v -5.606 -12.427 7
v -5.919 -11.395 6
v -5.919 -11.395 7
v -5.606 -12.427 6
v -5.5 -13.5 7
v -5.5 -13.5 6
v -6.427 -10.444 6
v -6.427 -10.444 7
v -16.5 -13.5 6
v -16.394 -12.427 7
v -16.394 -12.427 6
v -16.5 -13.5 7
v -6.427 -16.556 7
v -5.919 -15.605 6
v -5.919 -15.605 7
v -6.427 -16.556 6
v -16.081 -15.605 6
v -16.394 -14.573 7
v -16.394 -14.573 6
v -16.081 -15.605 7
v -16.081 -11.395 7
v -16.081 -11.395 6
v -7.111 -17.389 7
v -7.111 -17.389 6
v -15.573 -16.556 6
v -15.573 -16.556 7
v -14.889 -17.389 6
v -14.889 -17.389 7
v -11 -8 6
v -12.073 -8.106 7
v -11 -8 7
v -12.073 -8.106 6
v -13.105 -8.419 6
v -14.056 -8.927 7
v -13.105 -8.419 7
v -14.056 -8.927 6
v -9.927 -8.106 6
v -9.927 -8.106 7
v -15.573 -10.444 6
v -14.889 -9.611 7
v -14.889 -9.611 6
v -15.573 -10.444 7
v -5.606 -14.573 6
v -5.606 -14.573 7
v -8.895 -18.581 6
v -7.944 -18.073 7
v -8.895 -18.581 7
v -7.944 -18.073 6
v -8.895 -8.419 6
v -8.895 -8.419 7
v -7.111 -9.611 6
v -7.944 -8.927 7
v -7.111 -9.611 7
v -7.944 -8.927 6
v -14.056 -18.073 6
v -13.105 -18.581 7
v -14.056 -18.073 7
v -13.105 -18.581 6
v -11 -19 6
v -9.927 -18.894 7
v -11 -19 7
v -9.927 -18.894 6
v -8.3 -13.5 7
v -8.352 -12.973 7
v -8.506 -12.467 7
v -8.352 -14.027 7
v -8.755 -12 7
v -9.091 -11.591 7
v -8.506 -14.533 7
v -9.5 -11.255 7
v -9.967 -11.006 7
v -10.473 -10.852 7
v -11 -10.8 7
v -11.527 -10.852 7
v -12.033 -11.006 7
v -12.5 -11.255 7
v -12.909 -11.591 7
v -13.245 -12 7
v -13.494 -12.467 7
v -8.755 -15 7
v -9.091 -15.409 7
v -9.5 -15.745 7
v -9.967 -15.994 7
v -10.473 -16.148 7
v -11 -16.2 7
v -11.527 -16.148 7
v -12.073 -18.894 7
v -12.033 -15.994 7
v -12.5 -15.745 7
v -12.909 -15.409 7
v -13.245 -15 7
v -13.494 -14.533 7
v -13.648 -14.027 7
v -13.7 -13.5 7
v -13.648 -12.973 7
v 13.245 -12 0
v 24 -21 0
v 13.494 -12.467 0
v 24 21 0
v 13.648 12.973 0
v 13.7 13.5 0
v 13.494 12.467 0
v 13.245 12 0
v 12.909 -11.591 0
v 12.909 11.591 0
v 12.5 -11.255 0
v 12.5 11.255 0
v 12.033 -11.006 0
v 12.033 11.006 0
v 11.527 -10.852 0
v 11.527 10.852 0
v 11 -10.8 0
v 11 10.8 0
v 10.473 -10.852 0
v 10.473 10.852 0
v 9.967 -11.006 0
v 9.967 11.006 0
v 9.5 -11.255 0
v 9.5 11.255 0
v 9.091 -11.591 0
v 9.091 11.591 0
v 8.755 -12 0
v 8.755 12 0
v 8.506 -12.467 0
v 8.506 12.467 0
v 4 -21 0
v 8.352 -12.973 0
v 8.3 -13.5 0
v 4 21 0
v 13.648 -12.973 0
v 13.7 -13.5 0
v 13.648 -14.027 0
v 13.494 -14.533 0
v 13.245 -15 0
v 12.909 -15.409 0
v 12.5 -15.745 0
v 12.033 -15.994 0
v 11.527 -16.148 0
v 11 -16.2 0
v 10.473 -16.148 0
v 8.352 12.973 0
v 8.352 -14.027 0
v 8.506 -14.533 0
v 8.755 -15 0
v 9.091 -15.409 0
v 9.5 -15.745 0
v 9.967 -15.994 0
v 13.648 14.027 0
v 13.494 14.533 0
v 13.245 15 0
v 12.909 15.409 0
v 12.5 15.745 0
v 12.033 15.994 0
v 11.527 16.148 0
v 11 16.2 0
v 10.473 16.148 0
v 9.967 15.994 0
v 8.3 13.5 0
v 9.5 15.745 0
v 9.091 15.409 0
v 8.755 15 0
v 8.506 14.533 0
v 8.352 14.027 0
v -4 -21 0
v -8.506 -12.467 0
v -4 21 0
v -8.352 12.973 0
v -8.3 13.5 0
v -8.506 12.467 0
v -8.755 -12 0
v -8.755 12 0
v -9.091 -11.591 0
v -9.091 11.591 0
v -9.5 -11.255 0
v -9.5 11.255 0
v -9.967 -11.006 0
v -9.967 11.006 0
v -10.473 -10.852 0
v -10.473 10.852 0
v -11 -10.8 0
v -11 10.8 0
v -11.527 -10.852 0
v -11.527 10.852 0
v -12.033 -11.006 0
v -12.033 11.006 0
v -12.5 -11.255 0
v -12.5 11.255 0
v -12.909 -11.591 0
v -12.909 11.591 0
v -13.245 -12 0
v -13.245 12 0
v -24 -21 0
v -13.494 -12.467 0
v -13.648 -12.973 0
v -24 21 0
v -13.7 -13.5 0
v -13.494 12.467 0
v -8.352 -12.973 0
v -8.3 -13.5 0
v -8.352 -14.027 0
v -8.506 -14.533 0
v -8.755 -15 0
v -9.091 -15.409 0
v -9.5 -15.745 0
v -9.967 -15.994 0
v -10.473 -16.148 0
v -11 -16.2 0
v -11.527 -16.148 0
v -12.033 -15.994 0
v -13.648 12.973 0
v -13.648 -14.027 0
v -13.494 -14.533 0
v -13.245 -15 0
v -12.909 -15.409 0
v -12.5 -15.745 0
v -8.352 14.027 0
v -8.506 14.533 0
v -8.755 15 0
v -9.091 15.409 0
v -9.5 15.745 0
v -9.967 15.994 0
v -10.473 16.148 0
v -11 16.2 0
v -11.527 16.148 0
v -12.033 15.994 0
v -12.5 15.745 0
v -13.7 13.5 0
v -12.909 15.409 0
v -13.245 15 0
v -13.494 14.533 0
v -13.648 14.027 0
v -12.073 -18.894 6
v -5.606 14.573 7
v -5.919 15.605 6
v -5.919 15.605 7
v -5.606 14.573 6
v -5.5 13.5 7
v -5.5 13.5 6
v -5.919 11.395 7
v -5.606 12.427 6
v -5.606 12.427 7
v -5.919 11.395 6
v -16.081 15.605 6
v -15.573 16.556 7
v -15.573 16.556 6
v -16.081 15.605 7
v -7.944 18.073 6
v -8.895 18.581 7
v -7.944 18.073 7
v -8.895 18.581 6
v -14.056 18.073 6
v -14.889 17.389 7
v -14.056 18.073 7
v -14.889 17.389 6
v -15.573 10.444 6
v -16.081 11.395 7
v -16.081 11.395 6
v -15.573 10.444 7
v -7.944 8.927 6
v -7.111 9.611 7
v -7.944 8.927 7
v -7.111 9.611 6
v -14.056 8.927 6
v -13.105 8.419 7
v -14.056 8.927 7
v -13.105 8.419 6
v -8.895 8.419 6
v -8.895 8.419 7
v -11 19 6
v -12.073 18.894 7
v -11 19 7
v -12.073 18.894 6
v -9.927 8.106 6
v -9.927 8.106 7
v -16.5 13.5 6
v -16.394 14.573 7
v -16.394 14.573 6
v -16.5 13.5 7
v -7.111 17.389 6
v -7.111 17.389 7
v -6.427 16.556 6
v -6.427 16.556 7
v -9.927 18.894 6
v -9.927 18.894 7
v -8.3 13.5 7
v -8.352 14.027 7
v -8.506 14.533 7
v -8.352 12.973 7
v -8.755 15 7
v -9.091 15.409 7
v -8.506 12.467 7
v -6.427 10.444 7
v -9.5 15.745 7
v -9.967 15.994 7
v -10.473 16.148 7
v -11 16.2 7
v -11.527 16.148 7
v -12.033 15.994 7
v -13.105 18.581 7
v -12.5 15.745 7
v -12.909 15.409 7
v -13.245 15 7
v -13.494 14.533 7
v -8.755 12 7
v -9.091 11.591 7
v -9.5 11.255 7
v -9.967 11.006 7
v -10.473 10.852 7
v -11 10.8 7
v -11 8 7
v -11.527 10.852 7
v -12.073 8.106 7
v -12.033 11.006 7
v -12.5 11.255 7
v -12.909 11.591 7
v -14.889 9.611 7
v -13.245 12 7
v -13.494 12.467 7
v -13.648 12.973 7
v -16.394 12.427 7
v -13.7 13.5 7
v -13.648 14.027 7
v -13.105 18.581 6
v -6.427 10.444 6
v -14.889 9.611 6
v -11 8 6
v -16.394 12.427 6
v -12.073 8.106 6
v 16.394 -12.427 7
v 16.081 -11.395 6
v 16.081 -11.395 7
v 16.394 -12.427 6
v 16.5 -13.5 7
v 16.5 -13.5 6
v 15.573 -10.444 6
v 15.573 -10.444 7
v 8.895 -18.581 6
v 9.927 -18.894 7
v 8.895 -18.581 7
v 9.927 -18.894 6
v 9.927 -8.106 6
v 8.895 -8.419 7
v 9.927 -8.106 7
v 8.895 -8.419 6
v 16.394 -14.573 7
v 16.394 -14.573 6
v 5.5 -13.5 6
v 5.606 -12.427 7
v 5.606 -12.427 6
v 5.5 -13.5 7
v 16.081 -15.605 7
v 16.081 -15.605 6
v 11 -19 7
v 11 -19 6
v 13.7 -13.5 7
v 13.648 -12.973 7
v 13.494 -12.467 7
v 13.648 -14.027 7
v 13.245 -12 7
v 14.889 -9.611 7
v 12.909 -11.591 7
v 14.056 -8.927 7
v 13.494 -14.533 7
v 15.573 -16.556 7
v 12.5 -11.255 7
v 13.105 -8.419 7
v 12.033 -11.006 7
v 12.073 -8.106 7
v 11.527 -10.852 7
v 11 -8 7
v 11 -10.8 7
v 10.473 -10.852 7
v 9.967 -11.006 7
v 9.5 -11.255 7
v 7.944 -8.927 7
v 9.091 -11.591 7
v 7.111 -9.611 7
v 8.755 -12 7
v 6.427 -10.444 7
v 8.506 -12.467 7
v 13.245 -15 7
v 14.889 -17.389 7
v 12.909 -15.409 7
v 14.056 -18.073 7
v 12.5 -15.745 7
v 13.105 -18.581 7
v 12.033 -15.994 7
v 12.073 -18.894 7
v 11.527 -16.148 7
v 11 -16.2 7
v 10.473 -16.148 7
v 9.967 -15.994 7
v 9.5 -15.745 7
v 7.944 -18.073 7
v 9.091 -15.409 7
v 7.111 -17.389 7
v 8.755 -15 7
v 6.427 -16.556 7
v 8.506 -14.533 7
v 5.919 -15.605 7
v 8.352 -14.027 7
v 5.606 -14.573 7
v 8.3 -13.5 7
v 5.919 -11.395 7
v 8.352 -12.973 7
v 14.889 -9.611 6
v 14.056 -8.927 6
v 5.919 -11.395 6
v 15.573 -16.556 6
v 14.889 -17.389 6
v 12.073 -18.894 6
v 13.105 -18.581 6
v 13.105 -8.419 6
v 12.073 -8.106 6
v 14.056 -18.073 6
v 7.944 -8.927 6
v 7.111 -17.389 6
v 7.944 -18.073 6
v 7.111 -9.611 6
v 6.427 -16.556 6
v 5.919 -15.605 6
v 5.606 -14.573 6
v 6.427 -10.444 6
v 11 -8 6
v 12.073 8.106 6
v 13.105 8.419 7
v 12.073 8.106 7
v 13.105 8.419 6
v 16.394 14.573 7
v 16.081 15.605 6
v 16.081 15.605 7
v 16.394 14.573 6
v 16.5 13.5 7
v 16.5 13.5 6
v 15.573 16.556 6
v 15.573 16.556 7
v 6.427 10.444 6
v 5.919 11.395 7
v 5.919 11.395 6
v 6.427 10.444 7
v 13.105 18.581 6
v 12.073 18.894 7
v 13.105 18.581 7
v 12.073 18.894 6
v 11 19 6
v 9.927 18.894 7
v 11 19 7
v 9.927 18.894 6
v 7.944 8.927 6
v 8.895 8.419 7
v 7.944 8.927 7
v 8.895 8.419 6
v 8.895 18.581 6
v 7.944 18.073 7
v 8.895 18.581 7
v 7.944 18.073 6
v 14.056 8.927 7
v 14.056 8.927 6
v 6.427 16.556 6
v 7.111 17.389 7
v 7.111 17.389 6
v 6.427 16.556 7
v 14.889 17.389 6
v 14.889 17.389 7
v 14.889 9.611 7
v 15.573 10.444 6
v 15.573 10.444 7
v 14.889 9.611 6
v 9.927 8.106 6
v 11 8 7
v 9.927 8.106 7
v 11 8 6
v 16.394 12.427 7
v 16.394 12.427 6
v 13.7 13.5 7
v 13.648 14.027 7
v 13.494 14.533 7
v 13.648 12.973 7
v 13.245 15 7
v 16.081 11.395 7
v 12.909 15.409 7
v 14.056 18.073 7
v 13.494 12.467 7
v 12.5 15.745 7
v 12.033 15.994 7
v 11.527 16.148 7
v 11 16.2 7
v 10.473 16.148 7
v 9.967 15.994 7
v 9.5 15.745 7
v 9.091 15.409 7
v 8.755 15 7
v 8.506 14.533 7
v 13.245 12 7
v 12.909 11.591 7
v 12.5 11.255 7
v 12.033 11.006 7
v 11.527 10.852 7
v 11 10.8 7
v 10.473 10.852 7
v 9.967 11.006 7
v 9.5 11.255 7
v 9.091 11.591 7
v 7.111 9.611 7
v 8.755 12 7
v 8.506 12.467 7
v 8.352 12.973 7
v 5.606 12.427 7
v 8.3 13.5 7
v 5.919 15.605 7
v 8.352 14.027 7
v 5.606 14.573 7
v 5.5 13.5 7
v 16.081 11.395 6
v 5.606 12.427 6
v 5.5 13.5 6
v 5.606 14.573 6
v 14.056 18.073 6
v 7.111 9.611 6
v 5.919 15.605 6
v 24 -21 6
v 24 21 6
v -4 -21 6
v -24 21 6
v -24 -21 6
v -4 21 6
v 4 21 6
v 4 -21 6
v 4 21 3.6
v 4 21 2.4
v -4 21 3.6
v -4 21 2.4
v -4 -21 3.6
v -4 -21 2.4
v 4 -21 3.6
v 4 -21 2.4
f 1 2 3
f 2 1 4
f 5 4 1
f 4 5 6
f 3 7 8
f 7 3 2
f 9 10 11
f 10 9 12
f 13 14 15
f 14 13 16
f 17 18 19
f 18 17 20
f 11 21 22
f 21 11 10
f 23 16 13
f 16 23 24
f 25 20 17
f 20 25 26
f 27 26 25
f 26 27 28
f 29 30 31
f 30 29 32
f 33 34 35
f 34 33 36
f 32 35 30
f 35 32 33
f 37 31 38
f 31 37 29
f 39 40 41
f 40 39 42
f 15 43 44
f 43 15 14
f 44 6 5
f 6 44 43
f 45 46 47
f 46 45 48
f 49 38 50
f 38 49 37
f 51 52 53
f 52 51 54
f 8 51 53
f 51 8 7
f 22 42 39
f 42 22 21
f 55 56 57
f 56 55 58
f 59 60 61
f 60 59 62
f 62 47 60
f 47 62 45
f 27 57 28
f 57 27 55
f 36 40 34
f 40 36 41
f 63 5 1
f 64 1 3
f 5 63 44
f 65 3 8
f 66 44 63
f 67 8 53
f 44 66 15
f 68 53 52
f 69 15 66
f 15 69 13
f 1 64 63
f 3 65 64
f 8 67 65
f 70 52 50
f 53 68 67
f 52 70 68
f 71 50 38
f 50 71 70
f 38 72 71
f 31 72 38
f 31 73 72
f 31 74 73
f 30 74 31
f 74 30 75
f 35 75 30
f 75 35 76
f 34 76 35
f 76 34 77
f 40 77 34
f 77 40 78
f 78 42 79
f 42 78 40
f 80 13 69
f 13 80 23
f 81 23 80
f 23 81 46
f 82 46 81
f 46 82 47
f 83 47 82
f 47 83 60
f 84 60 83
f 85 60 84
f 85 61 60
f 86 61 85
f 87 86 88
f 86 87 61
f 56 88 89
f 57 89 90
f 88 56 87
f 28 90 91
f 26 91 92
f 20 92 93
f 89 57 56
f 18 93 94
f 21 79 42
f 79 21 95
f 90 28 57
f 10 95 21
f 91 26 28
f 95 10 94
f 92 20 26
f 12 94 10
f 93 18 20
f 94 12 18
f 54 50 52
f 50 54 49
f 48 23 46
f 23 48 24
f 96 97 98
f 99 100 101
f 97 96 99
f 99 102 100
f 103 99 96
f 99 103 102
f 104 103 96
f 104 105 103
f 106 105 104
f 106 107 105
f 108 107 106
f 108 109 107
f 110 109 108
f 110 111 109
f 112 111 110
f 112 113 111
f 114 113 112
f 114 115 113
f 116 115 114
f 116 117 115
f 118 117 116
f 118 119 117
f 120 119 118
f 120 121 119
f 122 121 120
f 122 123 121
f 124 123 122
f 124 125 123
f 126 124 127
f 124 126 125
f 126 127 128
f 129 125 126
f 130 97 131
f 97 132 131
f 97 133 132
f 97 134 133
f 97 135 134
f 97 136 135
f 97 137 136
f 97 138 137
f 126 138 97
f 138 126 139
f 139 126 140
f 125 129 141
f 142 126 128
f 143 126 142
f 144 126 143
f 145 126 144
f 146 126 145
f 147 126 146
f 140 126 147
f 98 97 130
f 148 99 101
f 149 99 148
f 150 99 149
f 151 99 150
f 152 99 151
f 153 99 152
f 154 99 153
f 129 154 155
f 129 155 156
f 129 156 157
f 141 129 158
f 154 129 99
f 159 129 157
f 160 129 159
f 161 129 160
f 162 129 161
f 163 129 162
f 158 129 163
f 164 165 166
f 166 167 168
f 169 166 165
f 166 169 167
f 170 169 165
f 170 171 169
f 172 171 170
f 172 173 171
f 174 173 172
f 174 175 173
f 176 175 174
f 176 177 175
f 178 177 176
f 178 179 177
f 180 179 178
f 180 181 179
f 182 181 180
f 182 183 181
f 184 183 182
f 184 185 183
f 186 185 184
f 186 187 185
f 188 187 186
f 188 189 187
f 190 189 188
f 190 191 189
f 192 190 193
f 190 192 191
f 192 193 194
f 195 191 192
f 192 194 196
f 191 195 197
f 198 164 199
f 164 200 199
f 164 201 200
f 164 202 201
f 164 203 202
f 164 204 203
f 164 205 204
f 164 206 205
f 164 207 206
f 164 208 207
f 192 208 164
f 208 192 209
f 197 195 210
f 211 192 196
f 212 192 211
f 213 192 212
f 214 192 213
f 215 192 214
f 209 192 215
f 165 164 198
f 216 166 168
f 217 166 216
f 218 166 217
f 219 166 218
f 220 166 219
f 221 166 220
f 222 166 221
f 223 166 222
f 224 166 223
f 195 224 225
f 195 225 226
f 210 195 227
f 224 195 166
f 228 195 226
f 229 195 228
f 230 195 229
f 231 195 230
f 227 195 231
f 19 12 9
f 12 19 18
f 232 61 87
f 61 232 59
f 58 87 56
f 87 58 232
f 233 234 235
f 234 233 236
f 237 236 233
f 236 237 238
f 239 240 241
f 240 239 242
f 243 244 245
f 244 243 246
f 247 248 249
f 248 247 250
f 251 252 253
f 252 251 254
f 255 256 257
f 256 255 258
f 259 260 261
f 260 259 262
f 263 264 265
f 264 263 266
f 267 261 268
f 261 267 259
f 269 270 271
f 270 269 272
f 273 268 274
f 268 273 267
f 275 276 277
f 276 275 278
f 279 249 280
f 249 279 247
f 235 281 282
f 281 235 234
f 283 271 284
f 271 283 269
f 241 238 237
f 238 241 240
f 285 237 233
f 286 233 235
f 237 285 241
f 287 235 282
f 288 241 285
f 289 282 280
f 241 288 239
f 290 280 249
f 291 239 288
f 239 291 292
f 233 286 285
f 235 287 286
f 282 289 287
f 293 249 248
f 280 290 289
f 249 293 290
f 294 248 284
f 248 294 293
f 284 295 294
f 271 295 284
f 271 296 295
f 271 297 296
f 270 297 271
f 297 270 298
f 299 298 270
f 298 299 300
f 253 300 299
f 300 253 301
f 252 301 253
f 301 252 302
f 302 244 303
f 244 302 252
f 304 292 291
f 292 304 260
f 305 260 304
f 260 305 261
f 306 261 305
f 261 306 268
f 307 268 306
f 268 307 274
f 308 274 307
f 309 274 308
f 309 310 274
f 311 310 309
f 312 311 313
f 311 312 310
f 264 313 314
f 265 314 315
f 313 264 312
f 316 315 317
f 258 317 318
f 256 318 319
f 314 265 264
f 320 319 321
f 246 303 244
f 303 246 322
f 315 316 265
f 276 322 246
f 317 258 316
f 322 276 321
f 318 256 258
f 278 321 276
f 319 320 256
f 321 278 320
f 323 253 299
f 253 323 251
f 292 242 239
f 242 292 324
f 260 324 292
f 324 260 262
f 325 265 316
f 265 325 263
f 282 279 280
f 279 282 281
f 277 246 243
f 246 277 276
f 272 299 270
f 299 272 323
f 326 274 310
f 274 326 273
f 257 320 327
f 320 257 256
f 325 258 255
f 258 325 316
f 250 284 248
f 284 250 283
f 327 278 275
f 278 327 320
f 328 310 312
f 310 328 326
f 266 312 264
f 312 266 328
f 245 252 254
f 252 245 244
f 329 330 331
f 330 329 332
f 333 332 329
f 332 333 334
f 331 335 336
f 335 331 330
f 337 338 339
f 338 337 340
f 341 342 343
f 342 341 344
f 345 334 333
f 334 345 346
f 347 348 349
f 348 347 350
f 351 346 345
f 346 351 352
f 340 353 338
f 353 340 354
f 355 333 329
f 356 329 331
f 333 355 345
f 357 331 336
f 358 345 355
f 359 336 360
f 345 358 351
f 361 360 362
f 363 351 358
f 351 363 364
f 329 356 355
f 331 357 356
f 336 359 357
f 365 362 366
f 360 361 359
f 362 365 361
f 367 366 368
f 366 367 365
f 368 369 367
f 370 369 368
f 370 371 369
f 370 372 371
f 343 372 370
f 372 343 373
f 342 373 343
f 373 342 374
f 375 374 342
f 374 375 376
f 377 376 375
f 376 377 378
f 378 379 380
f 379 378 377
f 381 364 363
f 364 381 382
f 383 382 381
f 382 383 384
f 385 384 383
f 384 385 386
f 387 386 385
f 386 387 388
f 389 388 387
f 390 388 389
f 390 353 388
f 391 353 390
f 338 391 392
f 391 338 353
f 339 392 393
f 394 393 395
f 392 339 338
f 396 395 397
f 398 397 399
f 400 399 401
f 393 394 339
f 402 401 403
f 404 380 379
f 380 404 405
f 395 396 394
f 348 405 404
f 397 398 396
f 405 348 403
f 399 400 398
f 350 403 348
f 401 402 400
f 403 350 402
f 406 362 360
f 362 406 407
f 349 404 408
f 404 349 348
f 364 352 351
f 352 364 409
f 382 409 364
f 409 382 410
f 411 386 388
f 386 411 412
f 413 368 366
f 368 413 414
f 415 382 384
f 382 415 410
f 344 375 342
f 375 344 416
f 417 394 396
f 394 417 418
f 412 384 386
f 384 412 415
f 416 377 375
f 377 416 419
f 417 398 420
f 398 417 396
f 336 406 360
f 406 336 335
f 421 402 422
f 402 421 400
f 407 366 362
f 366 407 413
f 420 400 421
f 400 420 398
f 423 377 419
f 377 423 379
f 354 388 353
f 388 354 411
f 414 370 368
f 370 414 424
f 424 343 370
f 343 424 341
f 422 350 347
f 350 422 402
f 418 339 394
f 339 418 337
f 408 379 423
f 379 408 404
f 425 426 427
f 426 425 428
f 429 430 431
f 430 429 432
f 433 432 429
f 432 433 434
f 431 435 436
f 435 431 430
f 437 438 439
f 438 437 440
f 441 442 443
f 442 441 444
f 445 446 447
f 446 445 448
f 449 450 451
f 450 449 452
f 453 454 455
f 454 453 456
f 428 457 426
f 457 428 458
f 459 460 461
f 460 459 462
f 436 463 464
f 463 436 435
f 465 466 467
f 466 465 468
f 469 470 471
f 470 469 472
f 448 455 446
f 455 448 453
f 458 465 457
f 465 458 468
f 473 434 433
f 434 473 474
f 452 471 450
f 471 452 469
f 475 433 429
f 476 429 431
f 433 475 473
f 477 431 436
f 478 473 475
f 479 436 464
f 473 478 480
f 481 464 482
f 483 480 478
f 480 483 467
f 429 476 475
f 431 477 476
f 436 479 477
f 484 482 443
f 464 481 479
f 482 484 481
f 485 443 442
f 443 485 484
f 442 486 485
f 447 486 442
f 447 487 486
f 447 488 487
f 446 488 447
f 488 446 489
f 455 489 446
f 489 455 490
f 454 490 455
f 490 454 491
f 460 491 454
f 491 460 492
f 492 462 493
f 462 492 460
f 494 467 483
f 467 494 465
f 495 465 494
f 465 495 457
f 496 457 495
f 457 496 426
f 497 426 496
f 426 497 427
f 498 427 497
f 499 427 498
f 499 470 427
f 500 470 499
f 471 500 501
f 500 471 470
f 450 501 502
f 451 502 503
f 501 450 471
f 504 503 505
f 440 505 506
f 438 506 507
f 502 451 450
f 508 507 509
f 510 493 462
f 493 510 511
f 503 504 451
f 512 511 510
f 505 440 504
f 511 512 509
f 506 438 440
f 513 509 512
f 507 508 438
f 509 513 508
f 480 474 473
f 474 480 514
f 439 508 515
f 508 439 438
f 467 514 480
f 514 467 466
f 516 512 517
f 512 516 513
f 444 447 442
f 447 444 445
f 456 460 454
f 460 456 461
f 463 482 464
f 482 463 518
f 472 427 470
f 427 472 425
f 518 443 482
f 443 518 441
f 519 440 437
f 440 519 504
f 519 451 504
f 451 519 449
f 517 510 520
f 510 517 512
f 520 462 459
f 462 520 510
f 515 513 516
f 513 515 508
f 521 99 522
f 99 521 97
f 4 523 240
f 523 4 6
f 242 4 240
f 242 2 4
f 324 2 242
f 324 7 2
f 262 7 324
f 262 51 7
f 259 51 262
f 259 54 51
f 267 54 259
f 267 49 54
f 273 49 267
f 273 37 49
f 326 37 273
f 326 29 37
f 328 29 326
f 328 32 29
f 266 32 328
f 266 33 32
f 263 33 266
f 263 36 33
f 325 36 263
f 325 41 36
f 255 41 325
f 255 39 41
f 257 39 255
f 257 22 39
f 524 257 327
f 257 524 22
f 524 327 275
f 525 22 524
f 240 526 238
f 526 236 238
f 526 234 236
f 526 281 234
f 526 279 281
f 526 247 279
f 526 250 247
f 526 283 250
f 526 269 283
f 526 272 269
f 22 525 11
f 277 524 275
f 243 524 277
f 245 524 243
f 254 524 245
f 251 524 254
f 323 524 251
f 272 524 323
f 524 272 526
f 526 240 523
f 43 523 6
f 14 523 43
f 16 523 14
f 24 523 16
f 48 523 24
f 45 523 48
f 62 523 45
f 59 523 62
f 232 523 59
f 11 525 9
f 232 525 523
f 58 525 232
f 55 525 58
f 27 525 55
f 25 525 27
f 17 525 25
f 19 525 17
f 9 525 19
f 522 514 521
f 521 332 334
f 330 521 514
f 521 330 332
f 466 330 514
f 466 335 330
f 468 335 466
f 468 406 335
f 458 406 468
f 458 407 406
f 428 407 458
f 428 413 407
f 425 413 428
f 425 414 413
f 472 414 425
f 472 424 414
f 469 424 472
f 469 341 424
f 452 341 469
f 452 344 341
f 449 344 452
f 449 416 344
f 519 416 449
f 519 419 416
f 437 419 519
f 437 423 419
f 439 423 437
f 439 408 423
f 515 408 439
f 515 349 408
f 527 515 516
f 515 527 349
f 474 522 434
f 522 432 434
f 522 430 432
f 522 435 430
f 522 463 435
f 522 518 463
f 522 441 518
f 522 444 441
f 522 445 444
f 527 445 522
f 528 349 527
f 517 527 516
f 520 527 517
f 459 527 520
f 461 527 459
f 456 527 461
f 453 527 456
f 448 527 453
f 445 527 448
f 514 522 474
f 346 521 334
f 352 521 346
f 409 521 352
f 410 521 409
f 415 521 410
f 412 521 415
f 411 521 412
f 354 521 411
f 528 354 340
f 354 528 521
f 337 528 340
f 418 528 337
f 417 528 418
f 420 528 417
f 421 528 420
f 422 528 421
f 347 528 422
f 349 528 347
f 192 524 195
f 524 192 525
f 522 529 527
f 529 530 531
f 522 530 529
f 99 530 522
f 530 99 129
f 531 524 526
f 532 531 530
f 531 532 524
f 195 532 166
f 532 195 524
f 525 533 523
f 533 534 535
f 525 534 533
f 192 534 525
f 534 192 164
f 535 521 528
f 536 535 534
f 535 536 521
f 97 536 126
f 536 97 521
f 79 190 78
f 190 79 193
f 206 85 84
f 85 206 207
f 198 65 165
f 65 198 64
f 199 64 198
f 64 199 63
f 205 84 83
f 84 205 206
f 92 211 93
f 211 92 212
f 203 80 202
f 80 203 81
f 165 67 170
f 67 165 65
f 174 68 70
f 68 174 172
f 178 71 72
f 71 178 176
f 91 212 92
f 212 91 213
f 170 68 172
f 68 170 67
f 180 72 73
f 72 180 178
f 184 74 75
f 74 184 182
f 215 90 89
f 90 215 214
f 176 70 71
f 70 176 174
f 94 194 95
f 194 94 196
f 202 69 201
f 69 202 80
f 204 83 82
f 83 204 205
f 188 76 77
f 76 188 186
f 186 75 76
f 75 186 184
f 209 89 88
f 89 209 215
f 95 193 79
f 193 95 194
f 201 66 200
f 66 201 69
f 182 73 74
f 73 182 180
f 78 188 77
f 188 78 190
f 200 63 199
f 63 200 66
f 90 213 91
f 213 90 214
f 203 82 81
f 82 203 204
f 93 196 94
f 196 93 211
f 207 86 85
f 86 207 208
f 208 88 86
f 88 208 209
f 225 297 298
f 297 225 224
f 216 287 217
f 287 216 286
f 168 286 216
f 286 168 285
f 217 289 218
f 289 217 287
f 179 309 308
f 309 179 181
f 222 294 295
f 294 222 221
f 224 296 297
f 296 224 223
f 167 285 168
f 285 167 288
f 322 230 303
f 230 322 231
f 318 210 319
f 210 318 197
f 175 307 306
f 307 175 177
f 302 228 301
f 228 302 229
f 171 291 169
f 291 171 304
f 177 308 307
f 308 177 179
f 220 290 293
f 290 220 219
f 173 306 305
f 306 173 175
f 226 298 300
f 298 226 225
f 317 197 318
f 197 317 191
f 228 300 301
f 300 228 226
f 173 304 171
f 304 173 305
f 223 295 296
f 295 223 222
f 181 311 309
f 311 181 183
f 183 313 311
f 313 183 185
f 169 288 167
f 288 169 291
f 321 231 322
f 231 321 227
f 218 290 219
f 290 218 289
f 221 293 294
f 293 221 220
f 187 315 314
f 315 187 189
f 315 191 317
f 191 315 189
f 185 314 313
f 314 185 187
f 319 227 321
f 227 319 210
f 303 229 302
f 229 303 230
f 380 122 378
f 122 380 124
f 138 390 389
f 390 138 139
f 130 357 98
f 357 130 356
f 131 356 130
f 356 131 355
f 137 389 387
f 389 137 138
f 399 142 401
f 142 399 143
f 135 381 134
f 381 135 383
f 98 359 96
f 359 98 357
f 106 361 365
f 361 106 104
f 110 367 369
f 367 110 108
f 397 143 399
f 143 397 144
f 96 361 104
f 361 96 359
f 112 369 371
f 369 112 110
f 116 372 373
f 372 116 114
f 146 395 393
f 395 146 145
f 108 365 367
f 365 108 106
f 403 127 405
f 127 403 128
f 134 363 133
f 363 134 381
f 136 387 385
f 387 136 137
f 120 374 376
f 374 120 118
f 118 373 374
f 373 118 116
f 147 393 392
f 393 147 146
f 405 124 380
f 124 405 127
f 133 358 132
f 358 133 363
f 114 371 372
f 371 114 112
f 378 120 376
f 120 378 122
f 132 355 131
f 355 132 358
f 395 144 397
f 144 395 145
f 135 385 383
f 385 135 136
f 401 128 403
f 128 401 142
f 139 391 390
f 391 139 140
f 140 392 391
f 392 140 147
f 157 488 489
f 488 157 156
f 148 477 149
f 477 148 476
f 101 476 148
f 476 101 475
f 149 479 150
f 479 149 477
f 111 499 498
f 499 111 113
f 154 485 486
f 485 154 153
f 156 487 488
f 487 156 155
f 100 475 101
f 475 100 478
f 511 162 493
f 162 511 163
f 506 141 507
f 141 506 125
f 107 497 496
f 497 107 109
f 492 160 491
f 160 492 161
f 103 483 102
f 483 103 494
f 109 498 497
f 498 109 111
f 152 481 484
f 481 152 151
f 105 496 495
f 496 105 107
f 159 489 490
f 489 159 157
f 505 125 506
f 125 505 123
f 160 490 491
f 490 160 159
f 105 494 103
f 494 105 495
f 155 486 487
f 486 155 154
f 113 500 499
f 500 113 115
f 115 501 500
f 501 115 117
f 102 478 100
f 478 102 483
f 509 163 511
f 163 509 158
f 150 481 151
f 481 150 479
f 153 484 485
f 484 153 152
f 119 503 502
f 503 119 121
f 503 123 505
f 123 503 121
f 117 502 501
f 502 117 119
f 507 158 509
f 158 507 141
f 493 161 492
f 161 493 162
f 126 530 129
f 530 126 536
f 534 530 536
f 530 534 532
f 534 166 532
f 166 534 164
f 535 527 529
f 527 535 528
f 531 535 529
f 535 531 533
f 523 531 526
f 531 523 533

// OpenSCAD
$fn = 32;

// ----------------------------------------------------------------------
// Living hinge: 48 x 42 mm plates, 1.2 mm flexible web
// ----------------------------------------------------------------------

// --- parameters (mm) ---
plate_len = 20;           // plate length outside the web
plate_w = 42;             // plate width
thick = 6;                // plate thickness
web_half = 4;             // half width of the flex band
web_t = 1.2;              // flexible web thickness
web_z = 2.4;              // web position inside the thickness
boss_d = 11;              // screw boss diameter
boss_h = 7;               // screw boss height
boss_x = 11;              // screw boss distance from the web
screw_d = 5.4;            // screw hole

difference() {
  union() {
    /* one flat strip, later thinned at the middle */
    translate([-24, -21, 0]) cube([48, 42, 6]);
    /* screw bosses, sunk 0.5 mm into the plates */
    for (sx = [-11, 11]) {
      for (sy = [-13.5, 13.5]) {
        translate([sx, sy, 0]) cylinder(h = boss_h, d = boss_d);
      }
    }
  }
  /* channel from below: leaves the web on top of it */
  translate([-4, -23.5, -2.5]) cube([8, 47, 4.9]);
  /* channel from above: thins the web down to web_t */
  translate([-4, -23.5, 3.6]) cube([8, 47, 4.9]);
  /* screw holes through the bosses */
  for (sx = [-11, 11]) {
    for (sy = [-13.5, 13.5]) {
      translate([sx, sy, -2.5]) cylinder(h = boss_h + 5, d = screw_d);
    }
  }
}
